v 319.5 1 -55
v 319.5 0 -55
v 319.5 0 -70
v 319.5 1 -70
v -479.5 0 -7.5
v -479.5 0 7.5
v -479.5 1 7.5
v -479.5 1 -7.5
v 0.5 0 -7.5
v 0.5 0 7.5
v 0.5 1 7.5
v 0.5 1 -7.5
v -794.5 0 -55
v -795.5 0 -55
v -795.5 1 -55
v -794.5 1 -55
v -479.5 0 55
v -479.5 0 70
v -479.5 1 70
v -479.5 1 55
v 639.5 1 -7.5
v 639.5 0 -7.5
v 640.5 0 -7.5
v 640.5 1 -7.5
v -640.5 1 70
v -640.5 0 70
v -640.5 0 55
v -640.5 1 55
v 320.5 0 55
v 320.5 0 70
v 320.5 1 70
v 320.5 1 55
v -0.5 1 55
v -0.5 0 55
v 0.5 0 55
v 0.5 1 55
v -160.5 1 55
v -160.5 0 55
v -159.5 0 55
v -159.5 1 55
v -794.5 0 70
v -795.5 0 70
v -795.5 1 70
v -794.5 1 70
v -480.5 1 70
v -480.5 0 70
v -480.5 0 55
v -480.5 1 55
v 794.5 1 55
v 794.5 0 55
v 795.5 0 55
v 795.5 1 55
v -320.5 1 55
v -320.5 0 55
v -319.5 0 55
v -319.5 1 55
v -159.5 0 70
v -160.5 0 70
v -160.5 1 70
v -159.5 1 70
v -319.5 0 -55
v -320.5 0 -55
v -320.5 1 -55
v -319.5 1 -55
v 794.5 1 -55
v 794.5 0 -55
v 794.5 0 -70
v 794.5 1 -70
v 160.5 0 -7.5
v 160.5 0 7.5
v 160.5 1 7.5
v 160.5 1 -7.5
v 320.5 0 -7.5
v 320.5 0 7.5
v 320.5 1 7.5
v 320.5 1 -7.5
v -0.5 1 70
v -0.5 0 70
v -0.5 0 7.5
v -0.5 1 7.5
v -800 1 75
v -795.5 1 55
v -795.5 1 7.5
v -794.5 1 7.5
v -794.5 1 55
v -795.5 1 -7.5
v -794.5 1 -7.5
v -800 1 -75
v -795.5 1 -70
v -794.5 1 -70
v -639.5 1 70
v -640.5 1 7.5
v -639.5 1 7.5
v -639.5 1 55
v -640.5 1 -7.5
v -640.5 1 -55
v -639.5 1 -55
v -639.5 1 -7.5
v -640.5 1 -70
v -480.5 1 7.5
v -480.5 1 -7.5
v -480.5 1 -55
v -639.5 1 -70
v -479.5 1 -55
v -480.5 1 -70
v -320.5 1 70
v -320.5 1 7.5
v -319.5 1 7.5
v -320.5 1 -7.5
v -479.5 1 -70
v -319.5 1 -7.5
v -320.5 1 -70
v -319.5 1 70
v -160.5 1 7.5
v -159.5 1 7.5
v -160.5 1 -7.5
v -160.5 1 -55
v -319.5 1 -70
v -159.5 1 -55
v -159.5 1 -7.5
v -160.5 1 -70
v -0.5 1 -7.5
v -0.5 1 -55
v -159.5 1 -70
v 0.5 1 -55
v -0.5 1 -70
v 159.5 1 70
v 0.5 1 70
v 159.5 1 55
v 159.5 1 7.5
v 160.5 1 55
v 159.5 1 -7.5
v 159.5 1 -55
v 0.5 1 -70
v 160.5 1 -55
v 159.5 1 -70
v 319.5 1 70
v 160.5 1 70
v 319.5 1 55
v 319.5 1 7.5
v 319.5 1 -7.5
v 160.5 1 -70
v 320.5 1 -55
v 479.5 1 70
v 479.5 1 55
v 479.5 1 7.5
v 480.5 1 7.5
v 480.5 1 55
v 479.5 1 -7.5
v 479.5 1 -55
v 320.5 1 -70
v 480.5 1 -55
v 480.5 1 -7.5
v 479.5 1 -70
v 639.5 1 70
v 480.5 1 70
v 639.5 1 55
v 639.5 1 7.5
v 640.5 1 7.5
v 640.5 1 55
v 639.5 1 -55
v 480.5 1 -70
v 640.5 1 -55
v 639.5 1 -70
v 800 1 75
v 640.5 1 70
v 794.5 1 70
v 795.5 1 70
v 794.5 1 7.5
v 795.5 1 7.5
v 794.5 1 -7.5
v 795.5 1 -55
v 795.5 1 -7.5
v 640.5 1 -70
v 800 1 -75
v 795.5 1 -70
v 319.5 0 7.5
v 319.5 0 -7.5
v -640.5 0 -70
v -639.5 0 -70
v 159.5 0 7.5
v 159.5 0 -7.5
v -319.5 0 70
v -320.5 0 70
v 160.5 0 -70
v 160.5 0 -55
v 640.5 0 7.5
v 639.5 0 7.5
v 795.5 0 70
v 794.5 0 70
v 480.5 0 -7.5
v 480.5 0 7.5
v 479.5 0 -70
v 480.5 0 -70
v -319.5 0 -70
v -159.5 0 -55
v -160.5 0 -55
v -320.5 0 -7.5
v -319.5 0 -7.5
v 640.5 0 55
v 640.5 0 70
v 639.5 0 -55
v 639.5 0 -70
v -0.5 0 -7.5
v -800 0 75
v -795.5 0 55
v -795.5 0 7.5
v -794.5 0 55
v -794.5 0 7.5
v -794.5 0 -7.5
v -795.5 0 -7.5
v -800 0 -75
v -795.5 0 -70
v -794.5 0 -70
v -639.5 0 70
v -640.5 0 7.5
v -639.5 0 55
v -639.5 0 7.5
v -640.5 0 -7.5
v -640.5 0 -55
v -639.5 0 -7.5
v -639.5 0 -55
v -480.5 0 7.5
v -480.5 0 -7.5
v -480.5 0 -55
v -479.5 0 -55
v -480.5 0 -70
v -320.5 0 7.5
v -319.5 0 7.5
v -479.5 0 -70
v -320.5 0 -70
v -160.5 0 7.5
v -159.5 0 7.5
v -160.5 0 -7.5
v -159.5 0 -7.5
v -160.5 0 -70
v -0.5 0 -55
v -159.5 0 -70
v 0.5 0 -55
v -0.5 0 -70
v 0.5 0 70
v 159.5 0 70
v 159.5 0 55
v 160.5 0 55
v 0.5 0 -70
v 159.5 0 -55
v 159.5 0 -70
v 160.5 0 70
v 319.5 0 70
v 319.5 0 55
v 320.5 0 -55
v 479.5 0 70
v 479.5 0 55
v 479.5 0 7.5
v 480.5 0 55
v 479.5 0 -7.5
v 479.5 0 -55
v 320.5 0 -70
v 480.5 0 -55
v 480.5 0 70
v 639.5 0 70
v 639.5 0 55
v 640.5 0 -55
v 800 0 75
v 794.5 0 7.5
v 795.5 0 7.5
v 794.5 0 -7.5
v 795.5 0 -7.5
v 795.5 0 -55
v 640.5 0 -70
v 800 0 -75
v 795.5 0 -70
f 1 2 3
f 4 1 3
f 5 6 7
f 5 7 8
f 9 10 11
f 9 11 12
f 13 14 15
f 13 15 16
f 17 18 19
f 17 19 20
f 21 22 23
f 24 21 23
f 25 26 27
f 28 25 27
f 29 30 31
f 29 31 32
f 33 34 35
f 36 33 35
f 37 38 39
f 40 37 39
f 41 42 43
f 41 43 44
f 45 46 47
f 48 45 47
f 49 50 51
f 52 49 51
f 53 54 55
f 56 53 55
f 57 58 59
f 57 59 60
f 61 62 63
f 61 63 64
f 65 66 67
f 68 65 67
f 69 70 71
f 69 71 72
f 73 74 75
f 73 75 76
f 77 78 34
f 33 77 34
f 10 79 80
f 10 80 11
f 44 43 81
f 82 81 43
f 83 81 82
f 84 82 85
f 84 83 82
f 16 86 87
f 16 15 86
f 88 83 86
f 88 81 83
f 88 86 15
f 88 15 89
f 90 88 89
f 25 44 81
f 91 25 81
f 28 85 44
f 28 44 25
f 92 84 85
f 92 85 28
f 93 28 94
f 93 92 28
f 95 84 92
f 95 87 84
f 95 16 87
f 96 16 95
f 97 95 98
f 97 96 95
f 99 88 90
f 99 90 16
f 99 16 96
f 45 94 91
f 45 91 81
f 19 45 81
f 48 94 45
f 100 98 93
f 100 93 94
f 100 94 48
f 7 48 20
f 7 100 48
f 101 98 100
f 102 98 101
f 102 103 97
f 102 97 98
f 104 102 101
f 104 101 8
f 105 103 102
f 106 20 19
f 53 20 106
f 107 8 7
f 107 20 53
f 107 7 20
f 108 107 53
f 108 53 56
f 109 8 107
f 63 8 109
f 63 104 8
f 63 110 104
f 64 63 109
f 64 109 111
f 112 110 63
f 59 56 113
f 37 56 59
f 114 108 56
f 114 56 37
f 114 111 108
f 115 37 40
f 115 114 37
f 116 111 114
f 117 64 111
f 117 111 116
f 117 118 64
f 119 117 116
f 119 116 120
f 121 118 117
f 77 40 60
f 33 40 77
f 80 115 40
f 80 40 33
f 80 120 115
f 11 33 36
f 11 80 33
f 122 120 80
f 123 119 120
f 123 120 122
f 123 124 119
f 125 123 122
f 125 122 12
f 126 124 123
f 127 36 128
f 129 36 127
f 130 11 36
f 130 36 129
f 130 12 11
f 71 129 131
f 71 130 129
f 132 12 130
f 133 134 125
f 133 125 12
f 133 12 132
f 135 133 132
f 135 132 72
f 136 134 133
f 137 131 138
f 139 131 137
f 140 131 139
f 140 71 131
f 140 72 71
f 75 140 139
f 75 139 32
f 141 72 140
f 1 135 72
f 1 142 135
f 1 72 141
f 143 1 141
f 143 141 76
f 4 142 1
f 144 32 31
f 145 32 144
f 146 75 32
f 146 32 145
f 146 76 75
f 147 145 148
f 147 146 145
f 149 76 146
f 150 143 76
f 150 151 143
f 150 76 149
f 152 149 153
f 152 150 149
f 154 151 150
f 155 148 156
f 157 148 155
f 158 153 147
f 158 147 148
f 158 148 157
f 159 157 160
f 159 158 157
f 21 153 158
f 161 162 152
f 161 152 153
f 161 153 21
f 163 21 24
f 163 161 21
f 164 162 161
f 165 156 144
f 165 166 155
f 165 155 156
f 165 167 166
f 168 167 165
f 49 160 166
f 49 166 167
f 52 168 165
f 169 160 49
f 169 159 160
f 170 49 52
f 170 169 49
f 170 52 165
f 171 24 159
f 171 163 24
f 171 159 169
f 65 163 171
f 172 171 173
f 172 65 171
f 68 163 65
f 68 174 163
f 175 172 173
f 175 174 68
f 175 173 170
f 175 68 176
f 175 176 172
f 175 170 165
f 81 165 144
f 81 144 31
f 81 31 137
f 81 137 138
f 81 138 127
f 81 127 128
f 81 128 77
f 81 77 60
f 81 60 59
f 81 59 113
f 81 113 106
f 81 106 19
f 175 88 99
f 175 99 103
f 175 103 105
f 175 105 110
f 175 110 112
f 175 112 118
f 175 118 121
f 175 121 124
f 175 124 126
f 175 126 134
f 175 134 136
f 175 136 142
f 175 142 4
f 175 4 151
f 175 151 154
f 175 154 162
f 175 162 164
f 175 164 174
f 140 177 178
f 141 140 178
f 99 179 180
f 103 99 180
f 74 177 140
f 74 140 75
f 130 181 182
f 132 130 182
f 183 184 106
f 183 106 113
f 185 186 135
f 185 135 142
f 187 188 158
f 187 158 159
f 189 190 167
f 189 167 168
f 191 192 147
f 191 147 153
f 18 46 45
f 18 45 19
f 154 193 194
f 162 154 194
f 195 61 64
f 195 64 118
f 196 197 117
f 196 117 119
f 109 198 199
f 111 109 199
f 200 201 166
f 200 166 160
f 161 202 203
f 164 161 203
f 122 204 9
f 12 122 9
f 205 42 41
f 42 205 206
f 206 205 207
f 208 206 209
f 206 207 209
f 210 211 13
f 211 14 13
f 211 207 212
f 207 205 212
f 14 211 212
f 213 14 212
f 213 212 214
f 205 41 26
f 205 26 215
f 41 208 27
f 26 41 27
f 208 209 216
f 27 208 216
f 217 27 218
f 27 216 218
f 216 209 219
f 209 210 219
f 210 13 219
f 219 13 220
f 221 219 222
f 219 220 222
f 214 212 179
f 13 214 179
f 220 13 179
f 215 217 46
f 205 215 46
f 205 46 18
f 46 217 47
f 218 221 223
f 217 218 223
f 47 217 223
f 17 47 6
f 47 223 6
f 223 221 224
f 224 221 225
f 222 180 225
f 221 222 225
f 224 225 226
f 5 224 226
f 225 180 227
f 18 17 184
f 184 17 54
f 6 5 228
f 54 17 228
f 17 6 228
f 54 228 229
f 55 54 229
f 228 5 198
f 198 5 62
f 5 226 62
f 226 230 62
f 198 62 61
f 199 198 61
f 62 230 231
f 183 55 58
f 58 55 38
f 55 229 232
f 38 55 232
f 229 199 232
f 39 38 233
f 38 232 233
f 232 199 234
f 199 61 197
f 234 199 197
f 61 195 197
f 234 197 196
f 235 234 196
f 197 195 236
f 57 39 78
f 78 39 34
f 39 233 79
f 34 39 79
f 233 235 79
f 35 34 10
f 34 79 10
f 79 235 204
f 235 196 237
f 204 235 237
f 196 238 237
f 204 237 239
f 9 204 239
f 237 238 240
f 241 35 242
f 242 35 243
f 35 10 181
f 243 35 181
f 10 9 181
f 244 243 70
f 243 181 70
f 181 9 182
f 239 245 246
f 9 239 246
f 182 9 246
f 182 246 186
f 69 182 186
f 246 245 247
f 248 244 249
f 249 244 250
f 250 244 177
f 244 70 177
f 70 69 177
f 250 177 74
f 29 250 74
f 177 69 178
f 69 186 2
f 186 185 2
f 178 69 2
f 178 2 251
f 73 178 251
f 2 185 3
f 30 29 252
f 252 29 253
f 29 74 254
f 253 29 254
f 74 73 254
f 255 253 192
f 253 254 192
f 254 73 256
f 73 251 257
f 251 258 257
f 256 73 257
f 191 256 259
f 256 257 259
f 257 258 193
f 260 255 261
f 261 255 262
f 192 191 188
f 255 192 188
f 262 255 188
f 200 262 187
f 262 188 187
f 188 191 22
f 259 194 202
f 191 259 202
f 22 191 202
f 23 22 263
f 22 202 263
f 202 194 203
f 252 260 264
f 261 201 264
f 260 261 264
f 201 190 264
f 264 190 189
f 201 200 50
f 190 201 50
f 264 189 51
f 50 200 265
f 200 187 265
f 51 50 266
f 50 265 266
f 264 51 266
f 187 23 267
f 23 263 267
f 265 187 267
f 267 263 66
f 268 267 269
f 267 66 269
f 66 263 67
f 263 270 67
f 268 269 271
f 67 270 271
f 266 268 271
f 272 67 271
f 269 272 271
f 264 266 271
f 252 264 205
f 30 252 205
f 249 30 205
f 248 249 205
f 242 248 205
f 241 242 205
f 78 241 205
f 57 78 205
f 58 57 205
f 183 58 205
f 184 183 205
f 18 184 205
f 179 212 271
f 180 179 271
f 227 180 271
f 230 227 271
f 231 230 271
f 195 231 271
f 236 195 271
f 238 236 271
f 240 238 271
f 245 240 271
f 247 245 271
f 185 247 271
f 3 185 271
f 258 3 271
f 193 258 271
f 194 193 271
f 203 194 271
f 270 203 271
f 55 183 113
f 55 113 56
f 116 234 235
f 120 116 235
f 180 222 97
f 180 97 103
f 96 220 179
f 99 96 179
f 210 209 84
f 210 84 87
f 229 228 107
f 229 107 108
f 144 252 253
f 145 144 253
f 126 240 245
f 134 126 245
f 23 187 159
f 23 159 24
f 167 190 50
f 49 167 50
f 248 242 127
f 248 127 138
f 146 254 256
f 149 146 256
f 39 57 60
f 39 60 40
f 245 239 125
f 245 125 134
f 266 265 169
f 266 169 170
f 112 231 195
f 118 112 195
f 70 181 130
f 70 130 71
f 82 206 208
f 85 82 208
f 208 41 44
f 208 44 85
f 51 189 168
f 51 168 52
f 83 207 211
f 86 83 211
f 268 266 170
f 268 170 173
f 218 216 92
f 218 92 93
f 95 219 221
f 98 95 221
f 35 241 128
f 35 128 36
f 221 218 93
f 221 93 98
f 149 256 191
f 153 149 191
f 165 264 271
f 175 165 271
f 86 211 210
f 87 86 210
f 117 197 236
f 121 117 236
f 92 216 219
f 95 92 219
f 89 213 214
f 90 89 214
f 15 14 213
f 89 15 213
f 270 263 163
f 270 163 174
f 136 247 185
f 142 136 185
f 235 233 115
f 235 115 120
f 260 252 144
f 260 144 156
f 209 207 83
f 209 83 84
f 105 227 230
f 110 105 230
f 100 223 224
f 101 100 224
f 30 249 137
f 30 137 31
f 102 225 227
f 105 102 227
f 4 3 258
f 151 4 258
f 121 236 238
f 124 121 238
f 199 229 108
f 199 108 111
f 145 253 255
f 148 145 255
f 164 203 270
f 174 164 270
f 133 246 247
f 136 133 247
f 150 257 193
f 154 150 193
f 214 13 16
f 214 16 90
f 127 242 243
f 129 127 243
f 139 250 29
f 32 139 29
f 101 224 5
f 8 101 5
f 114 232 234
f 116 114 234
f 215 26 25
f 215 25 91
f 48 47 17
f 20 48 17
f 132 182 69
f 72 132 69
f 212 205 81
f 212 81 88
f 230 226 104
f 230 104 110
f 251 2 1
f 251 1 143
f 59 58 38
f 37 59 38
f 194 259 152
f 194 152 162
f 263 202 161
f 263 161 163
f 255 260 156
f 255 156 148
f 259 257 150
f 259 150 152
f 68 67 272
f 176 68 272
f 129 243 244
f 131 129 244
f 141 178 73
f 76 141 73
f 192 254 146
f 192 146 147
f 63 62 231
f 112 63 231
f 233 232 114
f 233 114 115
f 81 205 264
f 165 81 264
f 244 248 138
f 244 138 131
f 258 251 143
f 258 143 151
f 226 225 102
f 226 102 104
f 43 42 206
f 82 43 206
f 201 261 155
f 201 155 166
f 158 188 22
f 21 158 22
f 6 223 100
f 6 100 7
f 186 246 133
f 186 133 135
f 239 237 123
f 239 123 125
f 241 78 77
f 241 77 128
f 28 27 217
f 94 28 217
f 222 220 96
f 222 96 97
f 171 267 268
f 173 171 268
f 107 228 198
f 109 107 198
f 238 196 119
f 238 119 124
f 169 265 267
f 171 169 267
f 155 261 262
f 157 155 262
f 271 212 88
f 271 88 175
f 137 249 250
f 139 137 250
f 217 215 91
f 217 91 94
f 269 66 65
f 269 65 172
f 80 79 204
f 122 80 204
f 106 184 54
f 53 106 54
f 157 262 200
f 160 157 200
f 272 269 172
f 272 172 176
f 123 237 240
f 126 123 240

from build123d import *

# Parameters (mm, degrees)
SKETCH1_W           = 1600
SKETCH1_H           = 150
SKETCH1_W_2         = 1
SKETCH1_H_2         = 15
BOSS_EXTRUDE1_DEPTH = 1


with BuildPart() as part:
    # Sketch1 → Boss-Extrude1 (new body)
    with BuildSketch(Plane(origin=(0, 0, 0), x_dir=(1, 0, 0), z_dir=(0, 1, 0))):
        Rectangle(SKETCH1_W, SKETCH1_H)
        with Locations((-795, 62.5)):
            Rectangle(SKETCH1_W_2, SKETCH1_H_2, mode=Mode.SUBTRACT)
        with Locations((-795, 0)):
            Rectangle(SKETCH1_W_2, SKETCH1_H_2, mode=Mode.SUBTRACT)
        with Locations((-795, -62.5)):
            Rectangle(SKETCH1_W_2, SKETCH1_H_2, mode=Mode.SUBTRACT)
        with Locations((0, 62.5)):
            Rectangle(SKETCH1_W_2, SKETCH1_H_2, mode=Mode.SUBTRACT)
        Rectangle(SKETCH1_W_2, SKETCH1_H_2, mode=Mode.SUBTRACT)
        with Locations((0, -62.5)):
            Rectangle(SKETCH1_W_2, SKETCH1_H_2, mode=Mode.SUBTRACT)
        with Locations((160, -62.5)):
            Rectangle(SKETCH1_W_2, SKETCH1_H_2, mode=Mode.SUBTRACT)
        with Locations((795, 62.5)):
            Rectangle(SKETCH1_W_2, SKETCH1_H_2, mode=Mode.SUBTRACT)
        with Locations((795, 0)):
            Rectangle(SKETCH1_W_2, SKETCH1_H_2, mode=Mode.SUBTRACT)
        with Locations((795, -62.5)):
            Rectangle(SKETCH1_W_2, SKETCH1_H_2, mode=Mode.SUBTRACT)
        with Locations((160, 0)):
            Rectangle(SKETCH1_W_2, SKETCH1_H_2, mode=Mode.SUBTRACT)
        with Locations((160, 62.5)):
            Rectangle(SKETCH1_W_2, SKETCH1_H_2, mode=Mode.SUBTRACT)
        with Locations((320, -62.5)):
            Rectangle(SKETCH1_W_2, SKETCH1_H_2, mode=Mode.SUBTRACT)
        with Locations((320, 0)):
            Rectangle(SKETCH1_W_2, SKETCH1_H_2, mode=Mode.SUBTRACT)
        with Locations((320, 62.5)):
            Rectangle(SKETCH1_W_2, SKETCH1_H_2, mode=Mode.SUBTRACT)
        with Locations((480, -62.5)):
            Rectangle(SKETCH1_W_2, SKETCH1_H_2, mode=Mode.SUBTRACT)
        with Locations((480, 0)):
            Rectangle(SKETCH1_W_2, SKETCH1_H_2, mode=Mode.SUBTRACT)
        with Locations((480, 62.5)):
            Rectangle(SKETCH1_W_2, SKETCH1_H_2, mode=Mode.SUBTRACT)
        with Locations((640, -62.5)):
            Rectangle(SKETCH1_W_2, SKETCH1_H_2, mode=Mode.SUBTRACT)
        with Locations((640, 0)):
            Rectangle(SKETCH1_W_2, SKETCH1_H_2, mode=Mode.SUBTRACT)
        with Locations((640, 62.5)):
            Rectangle(SKETCH1_W_2, SKETCH1_H_2, mode=Mode.SUBTRACT)
        with Locations((-160, -62.5)):
            Rectangle(SKETCH1_W_2, SKETCH1_H_2, mode=Mode.SUBTRACT)
        with Locations((-160, 0)):
            Rectangle(SKETCH1_W_2, SKETCH1_H_2, mode=Mode.SUBTRACT)
        with Locations((-160, 62.5)):
            Rectangle(SKETCH1_W_2, SKETCH1_H_2, mode=Mode.SUBTRACT)
        with Locations((-320, -62.5)):
            Rectangle(SKETCH1_W_2, SKETCH1_H_2, mode=Mode.SUBTRACT)
        with Locations((-320, 0)):
            Rectangle(SKETCH1_W_2, SKETCH1_H_2, mode=Mode.SUBTRACT)
        with Locations((-320, 62.5)):
            Rectangle(SKETCH1_W_2, SKETCH1_H_2, mode=Mode.SUBTRACT)
        with Locations((-480, -62.5)):
            Rectangle(SKETCH1_W_2, SKETCH1_H_2, mode=Mode.SUBTRACT)
        with Locations((-480, 0)):
            Rectangle(SKETCH1_W_2, SKETCH1_H_2, mode=Mode.SUBTRACT)
        with Locations((-480, 62.5)):
            Rectangle(SKETCH1_W_2, SKETCH1_H_2, mode=Mode.SUBTRACT)
        with Locations((-640, -62.5)):
            Rectangle(SKETCH1_W_2, SKETCH1_H_2, mode=Mode.SUBTRACT)
        with Locations((-640, 0)):
            Rectangle(SKETCH1_W_2, SKETCH1_H_2, mode=Mode.SUBTRACT)
        with Locations((-640, 62.5)):
            Rectangle(SKETCH1_W_2, SKETCH1_H_2, mode=Mode.SUBTRACT)
    extrude(amount=BOSS_EXTRUDE1_DEPTH)


solid = part.part
